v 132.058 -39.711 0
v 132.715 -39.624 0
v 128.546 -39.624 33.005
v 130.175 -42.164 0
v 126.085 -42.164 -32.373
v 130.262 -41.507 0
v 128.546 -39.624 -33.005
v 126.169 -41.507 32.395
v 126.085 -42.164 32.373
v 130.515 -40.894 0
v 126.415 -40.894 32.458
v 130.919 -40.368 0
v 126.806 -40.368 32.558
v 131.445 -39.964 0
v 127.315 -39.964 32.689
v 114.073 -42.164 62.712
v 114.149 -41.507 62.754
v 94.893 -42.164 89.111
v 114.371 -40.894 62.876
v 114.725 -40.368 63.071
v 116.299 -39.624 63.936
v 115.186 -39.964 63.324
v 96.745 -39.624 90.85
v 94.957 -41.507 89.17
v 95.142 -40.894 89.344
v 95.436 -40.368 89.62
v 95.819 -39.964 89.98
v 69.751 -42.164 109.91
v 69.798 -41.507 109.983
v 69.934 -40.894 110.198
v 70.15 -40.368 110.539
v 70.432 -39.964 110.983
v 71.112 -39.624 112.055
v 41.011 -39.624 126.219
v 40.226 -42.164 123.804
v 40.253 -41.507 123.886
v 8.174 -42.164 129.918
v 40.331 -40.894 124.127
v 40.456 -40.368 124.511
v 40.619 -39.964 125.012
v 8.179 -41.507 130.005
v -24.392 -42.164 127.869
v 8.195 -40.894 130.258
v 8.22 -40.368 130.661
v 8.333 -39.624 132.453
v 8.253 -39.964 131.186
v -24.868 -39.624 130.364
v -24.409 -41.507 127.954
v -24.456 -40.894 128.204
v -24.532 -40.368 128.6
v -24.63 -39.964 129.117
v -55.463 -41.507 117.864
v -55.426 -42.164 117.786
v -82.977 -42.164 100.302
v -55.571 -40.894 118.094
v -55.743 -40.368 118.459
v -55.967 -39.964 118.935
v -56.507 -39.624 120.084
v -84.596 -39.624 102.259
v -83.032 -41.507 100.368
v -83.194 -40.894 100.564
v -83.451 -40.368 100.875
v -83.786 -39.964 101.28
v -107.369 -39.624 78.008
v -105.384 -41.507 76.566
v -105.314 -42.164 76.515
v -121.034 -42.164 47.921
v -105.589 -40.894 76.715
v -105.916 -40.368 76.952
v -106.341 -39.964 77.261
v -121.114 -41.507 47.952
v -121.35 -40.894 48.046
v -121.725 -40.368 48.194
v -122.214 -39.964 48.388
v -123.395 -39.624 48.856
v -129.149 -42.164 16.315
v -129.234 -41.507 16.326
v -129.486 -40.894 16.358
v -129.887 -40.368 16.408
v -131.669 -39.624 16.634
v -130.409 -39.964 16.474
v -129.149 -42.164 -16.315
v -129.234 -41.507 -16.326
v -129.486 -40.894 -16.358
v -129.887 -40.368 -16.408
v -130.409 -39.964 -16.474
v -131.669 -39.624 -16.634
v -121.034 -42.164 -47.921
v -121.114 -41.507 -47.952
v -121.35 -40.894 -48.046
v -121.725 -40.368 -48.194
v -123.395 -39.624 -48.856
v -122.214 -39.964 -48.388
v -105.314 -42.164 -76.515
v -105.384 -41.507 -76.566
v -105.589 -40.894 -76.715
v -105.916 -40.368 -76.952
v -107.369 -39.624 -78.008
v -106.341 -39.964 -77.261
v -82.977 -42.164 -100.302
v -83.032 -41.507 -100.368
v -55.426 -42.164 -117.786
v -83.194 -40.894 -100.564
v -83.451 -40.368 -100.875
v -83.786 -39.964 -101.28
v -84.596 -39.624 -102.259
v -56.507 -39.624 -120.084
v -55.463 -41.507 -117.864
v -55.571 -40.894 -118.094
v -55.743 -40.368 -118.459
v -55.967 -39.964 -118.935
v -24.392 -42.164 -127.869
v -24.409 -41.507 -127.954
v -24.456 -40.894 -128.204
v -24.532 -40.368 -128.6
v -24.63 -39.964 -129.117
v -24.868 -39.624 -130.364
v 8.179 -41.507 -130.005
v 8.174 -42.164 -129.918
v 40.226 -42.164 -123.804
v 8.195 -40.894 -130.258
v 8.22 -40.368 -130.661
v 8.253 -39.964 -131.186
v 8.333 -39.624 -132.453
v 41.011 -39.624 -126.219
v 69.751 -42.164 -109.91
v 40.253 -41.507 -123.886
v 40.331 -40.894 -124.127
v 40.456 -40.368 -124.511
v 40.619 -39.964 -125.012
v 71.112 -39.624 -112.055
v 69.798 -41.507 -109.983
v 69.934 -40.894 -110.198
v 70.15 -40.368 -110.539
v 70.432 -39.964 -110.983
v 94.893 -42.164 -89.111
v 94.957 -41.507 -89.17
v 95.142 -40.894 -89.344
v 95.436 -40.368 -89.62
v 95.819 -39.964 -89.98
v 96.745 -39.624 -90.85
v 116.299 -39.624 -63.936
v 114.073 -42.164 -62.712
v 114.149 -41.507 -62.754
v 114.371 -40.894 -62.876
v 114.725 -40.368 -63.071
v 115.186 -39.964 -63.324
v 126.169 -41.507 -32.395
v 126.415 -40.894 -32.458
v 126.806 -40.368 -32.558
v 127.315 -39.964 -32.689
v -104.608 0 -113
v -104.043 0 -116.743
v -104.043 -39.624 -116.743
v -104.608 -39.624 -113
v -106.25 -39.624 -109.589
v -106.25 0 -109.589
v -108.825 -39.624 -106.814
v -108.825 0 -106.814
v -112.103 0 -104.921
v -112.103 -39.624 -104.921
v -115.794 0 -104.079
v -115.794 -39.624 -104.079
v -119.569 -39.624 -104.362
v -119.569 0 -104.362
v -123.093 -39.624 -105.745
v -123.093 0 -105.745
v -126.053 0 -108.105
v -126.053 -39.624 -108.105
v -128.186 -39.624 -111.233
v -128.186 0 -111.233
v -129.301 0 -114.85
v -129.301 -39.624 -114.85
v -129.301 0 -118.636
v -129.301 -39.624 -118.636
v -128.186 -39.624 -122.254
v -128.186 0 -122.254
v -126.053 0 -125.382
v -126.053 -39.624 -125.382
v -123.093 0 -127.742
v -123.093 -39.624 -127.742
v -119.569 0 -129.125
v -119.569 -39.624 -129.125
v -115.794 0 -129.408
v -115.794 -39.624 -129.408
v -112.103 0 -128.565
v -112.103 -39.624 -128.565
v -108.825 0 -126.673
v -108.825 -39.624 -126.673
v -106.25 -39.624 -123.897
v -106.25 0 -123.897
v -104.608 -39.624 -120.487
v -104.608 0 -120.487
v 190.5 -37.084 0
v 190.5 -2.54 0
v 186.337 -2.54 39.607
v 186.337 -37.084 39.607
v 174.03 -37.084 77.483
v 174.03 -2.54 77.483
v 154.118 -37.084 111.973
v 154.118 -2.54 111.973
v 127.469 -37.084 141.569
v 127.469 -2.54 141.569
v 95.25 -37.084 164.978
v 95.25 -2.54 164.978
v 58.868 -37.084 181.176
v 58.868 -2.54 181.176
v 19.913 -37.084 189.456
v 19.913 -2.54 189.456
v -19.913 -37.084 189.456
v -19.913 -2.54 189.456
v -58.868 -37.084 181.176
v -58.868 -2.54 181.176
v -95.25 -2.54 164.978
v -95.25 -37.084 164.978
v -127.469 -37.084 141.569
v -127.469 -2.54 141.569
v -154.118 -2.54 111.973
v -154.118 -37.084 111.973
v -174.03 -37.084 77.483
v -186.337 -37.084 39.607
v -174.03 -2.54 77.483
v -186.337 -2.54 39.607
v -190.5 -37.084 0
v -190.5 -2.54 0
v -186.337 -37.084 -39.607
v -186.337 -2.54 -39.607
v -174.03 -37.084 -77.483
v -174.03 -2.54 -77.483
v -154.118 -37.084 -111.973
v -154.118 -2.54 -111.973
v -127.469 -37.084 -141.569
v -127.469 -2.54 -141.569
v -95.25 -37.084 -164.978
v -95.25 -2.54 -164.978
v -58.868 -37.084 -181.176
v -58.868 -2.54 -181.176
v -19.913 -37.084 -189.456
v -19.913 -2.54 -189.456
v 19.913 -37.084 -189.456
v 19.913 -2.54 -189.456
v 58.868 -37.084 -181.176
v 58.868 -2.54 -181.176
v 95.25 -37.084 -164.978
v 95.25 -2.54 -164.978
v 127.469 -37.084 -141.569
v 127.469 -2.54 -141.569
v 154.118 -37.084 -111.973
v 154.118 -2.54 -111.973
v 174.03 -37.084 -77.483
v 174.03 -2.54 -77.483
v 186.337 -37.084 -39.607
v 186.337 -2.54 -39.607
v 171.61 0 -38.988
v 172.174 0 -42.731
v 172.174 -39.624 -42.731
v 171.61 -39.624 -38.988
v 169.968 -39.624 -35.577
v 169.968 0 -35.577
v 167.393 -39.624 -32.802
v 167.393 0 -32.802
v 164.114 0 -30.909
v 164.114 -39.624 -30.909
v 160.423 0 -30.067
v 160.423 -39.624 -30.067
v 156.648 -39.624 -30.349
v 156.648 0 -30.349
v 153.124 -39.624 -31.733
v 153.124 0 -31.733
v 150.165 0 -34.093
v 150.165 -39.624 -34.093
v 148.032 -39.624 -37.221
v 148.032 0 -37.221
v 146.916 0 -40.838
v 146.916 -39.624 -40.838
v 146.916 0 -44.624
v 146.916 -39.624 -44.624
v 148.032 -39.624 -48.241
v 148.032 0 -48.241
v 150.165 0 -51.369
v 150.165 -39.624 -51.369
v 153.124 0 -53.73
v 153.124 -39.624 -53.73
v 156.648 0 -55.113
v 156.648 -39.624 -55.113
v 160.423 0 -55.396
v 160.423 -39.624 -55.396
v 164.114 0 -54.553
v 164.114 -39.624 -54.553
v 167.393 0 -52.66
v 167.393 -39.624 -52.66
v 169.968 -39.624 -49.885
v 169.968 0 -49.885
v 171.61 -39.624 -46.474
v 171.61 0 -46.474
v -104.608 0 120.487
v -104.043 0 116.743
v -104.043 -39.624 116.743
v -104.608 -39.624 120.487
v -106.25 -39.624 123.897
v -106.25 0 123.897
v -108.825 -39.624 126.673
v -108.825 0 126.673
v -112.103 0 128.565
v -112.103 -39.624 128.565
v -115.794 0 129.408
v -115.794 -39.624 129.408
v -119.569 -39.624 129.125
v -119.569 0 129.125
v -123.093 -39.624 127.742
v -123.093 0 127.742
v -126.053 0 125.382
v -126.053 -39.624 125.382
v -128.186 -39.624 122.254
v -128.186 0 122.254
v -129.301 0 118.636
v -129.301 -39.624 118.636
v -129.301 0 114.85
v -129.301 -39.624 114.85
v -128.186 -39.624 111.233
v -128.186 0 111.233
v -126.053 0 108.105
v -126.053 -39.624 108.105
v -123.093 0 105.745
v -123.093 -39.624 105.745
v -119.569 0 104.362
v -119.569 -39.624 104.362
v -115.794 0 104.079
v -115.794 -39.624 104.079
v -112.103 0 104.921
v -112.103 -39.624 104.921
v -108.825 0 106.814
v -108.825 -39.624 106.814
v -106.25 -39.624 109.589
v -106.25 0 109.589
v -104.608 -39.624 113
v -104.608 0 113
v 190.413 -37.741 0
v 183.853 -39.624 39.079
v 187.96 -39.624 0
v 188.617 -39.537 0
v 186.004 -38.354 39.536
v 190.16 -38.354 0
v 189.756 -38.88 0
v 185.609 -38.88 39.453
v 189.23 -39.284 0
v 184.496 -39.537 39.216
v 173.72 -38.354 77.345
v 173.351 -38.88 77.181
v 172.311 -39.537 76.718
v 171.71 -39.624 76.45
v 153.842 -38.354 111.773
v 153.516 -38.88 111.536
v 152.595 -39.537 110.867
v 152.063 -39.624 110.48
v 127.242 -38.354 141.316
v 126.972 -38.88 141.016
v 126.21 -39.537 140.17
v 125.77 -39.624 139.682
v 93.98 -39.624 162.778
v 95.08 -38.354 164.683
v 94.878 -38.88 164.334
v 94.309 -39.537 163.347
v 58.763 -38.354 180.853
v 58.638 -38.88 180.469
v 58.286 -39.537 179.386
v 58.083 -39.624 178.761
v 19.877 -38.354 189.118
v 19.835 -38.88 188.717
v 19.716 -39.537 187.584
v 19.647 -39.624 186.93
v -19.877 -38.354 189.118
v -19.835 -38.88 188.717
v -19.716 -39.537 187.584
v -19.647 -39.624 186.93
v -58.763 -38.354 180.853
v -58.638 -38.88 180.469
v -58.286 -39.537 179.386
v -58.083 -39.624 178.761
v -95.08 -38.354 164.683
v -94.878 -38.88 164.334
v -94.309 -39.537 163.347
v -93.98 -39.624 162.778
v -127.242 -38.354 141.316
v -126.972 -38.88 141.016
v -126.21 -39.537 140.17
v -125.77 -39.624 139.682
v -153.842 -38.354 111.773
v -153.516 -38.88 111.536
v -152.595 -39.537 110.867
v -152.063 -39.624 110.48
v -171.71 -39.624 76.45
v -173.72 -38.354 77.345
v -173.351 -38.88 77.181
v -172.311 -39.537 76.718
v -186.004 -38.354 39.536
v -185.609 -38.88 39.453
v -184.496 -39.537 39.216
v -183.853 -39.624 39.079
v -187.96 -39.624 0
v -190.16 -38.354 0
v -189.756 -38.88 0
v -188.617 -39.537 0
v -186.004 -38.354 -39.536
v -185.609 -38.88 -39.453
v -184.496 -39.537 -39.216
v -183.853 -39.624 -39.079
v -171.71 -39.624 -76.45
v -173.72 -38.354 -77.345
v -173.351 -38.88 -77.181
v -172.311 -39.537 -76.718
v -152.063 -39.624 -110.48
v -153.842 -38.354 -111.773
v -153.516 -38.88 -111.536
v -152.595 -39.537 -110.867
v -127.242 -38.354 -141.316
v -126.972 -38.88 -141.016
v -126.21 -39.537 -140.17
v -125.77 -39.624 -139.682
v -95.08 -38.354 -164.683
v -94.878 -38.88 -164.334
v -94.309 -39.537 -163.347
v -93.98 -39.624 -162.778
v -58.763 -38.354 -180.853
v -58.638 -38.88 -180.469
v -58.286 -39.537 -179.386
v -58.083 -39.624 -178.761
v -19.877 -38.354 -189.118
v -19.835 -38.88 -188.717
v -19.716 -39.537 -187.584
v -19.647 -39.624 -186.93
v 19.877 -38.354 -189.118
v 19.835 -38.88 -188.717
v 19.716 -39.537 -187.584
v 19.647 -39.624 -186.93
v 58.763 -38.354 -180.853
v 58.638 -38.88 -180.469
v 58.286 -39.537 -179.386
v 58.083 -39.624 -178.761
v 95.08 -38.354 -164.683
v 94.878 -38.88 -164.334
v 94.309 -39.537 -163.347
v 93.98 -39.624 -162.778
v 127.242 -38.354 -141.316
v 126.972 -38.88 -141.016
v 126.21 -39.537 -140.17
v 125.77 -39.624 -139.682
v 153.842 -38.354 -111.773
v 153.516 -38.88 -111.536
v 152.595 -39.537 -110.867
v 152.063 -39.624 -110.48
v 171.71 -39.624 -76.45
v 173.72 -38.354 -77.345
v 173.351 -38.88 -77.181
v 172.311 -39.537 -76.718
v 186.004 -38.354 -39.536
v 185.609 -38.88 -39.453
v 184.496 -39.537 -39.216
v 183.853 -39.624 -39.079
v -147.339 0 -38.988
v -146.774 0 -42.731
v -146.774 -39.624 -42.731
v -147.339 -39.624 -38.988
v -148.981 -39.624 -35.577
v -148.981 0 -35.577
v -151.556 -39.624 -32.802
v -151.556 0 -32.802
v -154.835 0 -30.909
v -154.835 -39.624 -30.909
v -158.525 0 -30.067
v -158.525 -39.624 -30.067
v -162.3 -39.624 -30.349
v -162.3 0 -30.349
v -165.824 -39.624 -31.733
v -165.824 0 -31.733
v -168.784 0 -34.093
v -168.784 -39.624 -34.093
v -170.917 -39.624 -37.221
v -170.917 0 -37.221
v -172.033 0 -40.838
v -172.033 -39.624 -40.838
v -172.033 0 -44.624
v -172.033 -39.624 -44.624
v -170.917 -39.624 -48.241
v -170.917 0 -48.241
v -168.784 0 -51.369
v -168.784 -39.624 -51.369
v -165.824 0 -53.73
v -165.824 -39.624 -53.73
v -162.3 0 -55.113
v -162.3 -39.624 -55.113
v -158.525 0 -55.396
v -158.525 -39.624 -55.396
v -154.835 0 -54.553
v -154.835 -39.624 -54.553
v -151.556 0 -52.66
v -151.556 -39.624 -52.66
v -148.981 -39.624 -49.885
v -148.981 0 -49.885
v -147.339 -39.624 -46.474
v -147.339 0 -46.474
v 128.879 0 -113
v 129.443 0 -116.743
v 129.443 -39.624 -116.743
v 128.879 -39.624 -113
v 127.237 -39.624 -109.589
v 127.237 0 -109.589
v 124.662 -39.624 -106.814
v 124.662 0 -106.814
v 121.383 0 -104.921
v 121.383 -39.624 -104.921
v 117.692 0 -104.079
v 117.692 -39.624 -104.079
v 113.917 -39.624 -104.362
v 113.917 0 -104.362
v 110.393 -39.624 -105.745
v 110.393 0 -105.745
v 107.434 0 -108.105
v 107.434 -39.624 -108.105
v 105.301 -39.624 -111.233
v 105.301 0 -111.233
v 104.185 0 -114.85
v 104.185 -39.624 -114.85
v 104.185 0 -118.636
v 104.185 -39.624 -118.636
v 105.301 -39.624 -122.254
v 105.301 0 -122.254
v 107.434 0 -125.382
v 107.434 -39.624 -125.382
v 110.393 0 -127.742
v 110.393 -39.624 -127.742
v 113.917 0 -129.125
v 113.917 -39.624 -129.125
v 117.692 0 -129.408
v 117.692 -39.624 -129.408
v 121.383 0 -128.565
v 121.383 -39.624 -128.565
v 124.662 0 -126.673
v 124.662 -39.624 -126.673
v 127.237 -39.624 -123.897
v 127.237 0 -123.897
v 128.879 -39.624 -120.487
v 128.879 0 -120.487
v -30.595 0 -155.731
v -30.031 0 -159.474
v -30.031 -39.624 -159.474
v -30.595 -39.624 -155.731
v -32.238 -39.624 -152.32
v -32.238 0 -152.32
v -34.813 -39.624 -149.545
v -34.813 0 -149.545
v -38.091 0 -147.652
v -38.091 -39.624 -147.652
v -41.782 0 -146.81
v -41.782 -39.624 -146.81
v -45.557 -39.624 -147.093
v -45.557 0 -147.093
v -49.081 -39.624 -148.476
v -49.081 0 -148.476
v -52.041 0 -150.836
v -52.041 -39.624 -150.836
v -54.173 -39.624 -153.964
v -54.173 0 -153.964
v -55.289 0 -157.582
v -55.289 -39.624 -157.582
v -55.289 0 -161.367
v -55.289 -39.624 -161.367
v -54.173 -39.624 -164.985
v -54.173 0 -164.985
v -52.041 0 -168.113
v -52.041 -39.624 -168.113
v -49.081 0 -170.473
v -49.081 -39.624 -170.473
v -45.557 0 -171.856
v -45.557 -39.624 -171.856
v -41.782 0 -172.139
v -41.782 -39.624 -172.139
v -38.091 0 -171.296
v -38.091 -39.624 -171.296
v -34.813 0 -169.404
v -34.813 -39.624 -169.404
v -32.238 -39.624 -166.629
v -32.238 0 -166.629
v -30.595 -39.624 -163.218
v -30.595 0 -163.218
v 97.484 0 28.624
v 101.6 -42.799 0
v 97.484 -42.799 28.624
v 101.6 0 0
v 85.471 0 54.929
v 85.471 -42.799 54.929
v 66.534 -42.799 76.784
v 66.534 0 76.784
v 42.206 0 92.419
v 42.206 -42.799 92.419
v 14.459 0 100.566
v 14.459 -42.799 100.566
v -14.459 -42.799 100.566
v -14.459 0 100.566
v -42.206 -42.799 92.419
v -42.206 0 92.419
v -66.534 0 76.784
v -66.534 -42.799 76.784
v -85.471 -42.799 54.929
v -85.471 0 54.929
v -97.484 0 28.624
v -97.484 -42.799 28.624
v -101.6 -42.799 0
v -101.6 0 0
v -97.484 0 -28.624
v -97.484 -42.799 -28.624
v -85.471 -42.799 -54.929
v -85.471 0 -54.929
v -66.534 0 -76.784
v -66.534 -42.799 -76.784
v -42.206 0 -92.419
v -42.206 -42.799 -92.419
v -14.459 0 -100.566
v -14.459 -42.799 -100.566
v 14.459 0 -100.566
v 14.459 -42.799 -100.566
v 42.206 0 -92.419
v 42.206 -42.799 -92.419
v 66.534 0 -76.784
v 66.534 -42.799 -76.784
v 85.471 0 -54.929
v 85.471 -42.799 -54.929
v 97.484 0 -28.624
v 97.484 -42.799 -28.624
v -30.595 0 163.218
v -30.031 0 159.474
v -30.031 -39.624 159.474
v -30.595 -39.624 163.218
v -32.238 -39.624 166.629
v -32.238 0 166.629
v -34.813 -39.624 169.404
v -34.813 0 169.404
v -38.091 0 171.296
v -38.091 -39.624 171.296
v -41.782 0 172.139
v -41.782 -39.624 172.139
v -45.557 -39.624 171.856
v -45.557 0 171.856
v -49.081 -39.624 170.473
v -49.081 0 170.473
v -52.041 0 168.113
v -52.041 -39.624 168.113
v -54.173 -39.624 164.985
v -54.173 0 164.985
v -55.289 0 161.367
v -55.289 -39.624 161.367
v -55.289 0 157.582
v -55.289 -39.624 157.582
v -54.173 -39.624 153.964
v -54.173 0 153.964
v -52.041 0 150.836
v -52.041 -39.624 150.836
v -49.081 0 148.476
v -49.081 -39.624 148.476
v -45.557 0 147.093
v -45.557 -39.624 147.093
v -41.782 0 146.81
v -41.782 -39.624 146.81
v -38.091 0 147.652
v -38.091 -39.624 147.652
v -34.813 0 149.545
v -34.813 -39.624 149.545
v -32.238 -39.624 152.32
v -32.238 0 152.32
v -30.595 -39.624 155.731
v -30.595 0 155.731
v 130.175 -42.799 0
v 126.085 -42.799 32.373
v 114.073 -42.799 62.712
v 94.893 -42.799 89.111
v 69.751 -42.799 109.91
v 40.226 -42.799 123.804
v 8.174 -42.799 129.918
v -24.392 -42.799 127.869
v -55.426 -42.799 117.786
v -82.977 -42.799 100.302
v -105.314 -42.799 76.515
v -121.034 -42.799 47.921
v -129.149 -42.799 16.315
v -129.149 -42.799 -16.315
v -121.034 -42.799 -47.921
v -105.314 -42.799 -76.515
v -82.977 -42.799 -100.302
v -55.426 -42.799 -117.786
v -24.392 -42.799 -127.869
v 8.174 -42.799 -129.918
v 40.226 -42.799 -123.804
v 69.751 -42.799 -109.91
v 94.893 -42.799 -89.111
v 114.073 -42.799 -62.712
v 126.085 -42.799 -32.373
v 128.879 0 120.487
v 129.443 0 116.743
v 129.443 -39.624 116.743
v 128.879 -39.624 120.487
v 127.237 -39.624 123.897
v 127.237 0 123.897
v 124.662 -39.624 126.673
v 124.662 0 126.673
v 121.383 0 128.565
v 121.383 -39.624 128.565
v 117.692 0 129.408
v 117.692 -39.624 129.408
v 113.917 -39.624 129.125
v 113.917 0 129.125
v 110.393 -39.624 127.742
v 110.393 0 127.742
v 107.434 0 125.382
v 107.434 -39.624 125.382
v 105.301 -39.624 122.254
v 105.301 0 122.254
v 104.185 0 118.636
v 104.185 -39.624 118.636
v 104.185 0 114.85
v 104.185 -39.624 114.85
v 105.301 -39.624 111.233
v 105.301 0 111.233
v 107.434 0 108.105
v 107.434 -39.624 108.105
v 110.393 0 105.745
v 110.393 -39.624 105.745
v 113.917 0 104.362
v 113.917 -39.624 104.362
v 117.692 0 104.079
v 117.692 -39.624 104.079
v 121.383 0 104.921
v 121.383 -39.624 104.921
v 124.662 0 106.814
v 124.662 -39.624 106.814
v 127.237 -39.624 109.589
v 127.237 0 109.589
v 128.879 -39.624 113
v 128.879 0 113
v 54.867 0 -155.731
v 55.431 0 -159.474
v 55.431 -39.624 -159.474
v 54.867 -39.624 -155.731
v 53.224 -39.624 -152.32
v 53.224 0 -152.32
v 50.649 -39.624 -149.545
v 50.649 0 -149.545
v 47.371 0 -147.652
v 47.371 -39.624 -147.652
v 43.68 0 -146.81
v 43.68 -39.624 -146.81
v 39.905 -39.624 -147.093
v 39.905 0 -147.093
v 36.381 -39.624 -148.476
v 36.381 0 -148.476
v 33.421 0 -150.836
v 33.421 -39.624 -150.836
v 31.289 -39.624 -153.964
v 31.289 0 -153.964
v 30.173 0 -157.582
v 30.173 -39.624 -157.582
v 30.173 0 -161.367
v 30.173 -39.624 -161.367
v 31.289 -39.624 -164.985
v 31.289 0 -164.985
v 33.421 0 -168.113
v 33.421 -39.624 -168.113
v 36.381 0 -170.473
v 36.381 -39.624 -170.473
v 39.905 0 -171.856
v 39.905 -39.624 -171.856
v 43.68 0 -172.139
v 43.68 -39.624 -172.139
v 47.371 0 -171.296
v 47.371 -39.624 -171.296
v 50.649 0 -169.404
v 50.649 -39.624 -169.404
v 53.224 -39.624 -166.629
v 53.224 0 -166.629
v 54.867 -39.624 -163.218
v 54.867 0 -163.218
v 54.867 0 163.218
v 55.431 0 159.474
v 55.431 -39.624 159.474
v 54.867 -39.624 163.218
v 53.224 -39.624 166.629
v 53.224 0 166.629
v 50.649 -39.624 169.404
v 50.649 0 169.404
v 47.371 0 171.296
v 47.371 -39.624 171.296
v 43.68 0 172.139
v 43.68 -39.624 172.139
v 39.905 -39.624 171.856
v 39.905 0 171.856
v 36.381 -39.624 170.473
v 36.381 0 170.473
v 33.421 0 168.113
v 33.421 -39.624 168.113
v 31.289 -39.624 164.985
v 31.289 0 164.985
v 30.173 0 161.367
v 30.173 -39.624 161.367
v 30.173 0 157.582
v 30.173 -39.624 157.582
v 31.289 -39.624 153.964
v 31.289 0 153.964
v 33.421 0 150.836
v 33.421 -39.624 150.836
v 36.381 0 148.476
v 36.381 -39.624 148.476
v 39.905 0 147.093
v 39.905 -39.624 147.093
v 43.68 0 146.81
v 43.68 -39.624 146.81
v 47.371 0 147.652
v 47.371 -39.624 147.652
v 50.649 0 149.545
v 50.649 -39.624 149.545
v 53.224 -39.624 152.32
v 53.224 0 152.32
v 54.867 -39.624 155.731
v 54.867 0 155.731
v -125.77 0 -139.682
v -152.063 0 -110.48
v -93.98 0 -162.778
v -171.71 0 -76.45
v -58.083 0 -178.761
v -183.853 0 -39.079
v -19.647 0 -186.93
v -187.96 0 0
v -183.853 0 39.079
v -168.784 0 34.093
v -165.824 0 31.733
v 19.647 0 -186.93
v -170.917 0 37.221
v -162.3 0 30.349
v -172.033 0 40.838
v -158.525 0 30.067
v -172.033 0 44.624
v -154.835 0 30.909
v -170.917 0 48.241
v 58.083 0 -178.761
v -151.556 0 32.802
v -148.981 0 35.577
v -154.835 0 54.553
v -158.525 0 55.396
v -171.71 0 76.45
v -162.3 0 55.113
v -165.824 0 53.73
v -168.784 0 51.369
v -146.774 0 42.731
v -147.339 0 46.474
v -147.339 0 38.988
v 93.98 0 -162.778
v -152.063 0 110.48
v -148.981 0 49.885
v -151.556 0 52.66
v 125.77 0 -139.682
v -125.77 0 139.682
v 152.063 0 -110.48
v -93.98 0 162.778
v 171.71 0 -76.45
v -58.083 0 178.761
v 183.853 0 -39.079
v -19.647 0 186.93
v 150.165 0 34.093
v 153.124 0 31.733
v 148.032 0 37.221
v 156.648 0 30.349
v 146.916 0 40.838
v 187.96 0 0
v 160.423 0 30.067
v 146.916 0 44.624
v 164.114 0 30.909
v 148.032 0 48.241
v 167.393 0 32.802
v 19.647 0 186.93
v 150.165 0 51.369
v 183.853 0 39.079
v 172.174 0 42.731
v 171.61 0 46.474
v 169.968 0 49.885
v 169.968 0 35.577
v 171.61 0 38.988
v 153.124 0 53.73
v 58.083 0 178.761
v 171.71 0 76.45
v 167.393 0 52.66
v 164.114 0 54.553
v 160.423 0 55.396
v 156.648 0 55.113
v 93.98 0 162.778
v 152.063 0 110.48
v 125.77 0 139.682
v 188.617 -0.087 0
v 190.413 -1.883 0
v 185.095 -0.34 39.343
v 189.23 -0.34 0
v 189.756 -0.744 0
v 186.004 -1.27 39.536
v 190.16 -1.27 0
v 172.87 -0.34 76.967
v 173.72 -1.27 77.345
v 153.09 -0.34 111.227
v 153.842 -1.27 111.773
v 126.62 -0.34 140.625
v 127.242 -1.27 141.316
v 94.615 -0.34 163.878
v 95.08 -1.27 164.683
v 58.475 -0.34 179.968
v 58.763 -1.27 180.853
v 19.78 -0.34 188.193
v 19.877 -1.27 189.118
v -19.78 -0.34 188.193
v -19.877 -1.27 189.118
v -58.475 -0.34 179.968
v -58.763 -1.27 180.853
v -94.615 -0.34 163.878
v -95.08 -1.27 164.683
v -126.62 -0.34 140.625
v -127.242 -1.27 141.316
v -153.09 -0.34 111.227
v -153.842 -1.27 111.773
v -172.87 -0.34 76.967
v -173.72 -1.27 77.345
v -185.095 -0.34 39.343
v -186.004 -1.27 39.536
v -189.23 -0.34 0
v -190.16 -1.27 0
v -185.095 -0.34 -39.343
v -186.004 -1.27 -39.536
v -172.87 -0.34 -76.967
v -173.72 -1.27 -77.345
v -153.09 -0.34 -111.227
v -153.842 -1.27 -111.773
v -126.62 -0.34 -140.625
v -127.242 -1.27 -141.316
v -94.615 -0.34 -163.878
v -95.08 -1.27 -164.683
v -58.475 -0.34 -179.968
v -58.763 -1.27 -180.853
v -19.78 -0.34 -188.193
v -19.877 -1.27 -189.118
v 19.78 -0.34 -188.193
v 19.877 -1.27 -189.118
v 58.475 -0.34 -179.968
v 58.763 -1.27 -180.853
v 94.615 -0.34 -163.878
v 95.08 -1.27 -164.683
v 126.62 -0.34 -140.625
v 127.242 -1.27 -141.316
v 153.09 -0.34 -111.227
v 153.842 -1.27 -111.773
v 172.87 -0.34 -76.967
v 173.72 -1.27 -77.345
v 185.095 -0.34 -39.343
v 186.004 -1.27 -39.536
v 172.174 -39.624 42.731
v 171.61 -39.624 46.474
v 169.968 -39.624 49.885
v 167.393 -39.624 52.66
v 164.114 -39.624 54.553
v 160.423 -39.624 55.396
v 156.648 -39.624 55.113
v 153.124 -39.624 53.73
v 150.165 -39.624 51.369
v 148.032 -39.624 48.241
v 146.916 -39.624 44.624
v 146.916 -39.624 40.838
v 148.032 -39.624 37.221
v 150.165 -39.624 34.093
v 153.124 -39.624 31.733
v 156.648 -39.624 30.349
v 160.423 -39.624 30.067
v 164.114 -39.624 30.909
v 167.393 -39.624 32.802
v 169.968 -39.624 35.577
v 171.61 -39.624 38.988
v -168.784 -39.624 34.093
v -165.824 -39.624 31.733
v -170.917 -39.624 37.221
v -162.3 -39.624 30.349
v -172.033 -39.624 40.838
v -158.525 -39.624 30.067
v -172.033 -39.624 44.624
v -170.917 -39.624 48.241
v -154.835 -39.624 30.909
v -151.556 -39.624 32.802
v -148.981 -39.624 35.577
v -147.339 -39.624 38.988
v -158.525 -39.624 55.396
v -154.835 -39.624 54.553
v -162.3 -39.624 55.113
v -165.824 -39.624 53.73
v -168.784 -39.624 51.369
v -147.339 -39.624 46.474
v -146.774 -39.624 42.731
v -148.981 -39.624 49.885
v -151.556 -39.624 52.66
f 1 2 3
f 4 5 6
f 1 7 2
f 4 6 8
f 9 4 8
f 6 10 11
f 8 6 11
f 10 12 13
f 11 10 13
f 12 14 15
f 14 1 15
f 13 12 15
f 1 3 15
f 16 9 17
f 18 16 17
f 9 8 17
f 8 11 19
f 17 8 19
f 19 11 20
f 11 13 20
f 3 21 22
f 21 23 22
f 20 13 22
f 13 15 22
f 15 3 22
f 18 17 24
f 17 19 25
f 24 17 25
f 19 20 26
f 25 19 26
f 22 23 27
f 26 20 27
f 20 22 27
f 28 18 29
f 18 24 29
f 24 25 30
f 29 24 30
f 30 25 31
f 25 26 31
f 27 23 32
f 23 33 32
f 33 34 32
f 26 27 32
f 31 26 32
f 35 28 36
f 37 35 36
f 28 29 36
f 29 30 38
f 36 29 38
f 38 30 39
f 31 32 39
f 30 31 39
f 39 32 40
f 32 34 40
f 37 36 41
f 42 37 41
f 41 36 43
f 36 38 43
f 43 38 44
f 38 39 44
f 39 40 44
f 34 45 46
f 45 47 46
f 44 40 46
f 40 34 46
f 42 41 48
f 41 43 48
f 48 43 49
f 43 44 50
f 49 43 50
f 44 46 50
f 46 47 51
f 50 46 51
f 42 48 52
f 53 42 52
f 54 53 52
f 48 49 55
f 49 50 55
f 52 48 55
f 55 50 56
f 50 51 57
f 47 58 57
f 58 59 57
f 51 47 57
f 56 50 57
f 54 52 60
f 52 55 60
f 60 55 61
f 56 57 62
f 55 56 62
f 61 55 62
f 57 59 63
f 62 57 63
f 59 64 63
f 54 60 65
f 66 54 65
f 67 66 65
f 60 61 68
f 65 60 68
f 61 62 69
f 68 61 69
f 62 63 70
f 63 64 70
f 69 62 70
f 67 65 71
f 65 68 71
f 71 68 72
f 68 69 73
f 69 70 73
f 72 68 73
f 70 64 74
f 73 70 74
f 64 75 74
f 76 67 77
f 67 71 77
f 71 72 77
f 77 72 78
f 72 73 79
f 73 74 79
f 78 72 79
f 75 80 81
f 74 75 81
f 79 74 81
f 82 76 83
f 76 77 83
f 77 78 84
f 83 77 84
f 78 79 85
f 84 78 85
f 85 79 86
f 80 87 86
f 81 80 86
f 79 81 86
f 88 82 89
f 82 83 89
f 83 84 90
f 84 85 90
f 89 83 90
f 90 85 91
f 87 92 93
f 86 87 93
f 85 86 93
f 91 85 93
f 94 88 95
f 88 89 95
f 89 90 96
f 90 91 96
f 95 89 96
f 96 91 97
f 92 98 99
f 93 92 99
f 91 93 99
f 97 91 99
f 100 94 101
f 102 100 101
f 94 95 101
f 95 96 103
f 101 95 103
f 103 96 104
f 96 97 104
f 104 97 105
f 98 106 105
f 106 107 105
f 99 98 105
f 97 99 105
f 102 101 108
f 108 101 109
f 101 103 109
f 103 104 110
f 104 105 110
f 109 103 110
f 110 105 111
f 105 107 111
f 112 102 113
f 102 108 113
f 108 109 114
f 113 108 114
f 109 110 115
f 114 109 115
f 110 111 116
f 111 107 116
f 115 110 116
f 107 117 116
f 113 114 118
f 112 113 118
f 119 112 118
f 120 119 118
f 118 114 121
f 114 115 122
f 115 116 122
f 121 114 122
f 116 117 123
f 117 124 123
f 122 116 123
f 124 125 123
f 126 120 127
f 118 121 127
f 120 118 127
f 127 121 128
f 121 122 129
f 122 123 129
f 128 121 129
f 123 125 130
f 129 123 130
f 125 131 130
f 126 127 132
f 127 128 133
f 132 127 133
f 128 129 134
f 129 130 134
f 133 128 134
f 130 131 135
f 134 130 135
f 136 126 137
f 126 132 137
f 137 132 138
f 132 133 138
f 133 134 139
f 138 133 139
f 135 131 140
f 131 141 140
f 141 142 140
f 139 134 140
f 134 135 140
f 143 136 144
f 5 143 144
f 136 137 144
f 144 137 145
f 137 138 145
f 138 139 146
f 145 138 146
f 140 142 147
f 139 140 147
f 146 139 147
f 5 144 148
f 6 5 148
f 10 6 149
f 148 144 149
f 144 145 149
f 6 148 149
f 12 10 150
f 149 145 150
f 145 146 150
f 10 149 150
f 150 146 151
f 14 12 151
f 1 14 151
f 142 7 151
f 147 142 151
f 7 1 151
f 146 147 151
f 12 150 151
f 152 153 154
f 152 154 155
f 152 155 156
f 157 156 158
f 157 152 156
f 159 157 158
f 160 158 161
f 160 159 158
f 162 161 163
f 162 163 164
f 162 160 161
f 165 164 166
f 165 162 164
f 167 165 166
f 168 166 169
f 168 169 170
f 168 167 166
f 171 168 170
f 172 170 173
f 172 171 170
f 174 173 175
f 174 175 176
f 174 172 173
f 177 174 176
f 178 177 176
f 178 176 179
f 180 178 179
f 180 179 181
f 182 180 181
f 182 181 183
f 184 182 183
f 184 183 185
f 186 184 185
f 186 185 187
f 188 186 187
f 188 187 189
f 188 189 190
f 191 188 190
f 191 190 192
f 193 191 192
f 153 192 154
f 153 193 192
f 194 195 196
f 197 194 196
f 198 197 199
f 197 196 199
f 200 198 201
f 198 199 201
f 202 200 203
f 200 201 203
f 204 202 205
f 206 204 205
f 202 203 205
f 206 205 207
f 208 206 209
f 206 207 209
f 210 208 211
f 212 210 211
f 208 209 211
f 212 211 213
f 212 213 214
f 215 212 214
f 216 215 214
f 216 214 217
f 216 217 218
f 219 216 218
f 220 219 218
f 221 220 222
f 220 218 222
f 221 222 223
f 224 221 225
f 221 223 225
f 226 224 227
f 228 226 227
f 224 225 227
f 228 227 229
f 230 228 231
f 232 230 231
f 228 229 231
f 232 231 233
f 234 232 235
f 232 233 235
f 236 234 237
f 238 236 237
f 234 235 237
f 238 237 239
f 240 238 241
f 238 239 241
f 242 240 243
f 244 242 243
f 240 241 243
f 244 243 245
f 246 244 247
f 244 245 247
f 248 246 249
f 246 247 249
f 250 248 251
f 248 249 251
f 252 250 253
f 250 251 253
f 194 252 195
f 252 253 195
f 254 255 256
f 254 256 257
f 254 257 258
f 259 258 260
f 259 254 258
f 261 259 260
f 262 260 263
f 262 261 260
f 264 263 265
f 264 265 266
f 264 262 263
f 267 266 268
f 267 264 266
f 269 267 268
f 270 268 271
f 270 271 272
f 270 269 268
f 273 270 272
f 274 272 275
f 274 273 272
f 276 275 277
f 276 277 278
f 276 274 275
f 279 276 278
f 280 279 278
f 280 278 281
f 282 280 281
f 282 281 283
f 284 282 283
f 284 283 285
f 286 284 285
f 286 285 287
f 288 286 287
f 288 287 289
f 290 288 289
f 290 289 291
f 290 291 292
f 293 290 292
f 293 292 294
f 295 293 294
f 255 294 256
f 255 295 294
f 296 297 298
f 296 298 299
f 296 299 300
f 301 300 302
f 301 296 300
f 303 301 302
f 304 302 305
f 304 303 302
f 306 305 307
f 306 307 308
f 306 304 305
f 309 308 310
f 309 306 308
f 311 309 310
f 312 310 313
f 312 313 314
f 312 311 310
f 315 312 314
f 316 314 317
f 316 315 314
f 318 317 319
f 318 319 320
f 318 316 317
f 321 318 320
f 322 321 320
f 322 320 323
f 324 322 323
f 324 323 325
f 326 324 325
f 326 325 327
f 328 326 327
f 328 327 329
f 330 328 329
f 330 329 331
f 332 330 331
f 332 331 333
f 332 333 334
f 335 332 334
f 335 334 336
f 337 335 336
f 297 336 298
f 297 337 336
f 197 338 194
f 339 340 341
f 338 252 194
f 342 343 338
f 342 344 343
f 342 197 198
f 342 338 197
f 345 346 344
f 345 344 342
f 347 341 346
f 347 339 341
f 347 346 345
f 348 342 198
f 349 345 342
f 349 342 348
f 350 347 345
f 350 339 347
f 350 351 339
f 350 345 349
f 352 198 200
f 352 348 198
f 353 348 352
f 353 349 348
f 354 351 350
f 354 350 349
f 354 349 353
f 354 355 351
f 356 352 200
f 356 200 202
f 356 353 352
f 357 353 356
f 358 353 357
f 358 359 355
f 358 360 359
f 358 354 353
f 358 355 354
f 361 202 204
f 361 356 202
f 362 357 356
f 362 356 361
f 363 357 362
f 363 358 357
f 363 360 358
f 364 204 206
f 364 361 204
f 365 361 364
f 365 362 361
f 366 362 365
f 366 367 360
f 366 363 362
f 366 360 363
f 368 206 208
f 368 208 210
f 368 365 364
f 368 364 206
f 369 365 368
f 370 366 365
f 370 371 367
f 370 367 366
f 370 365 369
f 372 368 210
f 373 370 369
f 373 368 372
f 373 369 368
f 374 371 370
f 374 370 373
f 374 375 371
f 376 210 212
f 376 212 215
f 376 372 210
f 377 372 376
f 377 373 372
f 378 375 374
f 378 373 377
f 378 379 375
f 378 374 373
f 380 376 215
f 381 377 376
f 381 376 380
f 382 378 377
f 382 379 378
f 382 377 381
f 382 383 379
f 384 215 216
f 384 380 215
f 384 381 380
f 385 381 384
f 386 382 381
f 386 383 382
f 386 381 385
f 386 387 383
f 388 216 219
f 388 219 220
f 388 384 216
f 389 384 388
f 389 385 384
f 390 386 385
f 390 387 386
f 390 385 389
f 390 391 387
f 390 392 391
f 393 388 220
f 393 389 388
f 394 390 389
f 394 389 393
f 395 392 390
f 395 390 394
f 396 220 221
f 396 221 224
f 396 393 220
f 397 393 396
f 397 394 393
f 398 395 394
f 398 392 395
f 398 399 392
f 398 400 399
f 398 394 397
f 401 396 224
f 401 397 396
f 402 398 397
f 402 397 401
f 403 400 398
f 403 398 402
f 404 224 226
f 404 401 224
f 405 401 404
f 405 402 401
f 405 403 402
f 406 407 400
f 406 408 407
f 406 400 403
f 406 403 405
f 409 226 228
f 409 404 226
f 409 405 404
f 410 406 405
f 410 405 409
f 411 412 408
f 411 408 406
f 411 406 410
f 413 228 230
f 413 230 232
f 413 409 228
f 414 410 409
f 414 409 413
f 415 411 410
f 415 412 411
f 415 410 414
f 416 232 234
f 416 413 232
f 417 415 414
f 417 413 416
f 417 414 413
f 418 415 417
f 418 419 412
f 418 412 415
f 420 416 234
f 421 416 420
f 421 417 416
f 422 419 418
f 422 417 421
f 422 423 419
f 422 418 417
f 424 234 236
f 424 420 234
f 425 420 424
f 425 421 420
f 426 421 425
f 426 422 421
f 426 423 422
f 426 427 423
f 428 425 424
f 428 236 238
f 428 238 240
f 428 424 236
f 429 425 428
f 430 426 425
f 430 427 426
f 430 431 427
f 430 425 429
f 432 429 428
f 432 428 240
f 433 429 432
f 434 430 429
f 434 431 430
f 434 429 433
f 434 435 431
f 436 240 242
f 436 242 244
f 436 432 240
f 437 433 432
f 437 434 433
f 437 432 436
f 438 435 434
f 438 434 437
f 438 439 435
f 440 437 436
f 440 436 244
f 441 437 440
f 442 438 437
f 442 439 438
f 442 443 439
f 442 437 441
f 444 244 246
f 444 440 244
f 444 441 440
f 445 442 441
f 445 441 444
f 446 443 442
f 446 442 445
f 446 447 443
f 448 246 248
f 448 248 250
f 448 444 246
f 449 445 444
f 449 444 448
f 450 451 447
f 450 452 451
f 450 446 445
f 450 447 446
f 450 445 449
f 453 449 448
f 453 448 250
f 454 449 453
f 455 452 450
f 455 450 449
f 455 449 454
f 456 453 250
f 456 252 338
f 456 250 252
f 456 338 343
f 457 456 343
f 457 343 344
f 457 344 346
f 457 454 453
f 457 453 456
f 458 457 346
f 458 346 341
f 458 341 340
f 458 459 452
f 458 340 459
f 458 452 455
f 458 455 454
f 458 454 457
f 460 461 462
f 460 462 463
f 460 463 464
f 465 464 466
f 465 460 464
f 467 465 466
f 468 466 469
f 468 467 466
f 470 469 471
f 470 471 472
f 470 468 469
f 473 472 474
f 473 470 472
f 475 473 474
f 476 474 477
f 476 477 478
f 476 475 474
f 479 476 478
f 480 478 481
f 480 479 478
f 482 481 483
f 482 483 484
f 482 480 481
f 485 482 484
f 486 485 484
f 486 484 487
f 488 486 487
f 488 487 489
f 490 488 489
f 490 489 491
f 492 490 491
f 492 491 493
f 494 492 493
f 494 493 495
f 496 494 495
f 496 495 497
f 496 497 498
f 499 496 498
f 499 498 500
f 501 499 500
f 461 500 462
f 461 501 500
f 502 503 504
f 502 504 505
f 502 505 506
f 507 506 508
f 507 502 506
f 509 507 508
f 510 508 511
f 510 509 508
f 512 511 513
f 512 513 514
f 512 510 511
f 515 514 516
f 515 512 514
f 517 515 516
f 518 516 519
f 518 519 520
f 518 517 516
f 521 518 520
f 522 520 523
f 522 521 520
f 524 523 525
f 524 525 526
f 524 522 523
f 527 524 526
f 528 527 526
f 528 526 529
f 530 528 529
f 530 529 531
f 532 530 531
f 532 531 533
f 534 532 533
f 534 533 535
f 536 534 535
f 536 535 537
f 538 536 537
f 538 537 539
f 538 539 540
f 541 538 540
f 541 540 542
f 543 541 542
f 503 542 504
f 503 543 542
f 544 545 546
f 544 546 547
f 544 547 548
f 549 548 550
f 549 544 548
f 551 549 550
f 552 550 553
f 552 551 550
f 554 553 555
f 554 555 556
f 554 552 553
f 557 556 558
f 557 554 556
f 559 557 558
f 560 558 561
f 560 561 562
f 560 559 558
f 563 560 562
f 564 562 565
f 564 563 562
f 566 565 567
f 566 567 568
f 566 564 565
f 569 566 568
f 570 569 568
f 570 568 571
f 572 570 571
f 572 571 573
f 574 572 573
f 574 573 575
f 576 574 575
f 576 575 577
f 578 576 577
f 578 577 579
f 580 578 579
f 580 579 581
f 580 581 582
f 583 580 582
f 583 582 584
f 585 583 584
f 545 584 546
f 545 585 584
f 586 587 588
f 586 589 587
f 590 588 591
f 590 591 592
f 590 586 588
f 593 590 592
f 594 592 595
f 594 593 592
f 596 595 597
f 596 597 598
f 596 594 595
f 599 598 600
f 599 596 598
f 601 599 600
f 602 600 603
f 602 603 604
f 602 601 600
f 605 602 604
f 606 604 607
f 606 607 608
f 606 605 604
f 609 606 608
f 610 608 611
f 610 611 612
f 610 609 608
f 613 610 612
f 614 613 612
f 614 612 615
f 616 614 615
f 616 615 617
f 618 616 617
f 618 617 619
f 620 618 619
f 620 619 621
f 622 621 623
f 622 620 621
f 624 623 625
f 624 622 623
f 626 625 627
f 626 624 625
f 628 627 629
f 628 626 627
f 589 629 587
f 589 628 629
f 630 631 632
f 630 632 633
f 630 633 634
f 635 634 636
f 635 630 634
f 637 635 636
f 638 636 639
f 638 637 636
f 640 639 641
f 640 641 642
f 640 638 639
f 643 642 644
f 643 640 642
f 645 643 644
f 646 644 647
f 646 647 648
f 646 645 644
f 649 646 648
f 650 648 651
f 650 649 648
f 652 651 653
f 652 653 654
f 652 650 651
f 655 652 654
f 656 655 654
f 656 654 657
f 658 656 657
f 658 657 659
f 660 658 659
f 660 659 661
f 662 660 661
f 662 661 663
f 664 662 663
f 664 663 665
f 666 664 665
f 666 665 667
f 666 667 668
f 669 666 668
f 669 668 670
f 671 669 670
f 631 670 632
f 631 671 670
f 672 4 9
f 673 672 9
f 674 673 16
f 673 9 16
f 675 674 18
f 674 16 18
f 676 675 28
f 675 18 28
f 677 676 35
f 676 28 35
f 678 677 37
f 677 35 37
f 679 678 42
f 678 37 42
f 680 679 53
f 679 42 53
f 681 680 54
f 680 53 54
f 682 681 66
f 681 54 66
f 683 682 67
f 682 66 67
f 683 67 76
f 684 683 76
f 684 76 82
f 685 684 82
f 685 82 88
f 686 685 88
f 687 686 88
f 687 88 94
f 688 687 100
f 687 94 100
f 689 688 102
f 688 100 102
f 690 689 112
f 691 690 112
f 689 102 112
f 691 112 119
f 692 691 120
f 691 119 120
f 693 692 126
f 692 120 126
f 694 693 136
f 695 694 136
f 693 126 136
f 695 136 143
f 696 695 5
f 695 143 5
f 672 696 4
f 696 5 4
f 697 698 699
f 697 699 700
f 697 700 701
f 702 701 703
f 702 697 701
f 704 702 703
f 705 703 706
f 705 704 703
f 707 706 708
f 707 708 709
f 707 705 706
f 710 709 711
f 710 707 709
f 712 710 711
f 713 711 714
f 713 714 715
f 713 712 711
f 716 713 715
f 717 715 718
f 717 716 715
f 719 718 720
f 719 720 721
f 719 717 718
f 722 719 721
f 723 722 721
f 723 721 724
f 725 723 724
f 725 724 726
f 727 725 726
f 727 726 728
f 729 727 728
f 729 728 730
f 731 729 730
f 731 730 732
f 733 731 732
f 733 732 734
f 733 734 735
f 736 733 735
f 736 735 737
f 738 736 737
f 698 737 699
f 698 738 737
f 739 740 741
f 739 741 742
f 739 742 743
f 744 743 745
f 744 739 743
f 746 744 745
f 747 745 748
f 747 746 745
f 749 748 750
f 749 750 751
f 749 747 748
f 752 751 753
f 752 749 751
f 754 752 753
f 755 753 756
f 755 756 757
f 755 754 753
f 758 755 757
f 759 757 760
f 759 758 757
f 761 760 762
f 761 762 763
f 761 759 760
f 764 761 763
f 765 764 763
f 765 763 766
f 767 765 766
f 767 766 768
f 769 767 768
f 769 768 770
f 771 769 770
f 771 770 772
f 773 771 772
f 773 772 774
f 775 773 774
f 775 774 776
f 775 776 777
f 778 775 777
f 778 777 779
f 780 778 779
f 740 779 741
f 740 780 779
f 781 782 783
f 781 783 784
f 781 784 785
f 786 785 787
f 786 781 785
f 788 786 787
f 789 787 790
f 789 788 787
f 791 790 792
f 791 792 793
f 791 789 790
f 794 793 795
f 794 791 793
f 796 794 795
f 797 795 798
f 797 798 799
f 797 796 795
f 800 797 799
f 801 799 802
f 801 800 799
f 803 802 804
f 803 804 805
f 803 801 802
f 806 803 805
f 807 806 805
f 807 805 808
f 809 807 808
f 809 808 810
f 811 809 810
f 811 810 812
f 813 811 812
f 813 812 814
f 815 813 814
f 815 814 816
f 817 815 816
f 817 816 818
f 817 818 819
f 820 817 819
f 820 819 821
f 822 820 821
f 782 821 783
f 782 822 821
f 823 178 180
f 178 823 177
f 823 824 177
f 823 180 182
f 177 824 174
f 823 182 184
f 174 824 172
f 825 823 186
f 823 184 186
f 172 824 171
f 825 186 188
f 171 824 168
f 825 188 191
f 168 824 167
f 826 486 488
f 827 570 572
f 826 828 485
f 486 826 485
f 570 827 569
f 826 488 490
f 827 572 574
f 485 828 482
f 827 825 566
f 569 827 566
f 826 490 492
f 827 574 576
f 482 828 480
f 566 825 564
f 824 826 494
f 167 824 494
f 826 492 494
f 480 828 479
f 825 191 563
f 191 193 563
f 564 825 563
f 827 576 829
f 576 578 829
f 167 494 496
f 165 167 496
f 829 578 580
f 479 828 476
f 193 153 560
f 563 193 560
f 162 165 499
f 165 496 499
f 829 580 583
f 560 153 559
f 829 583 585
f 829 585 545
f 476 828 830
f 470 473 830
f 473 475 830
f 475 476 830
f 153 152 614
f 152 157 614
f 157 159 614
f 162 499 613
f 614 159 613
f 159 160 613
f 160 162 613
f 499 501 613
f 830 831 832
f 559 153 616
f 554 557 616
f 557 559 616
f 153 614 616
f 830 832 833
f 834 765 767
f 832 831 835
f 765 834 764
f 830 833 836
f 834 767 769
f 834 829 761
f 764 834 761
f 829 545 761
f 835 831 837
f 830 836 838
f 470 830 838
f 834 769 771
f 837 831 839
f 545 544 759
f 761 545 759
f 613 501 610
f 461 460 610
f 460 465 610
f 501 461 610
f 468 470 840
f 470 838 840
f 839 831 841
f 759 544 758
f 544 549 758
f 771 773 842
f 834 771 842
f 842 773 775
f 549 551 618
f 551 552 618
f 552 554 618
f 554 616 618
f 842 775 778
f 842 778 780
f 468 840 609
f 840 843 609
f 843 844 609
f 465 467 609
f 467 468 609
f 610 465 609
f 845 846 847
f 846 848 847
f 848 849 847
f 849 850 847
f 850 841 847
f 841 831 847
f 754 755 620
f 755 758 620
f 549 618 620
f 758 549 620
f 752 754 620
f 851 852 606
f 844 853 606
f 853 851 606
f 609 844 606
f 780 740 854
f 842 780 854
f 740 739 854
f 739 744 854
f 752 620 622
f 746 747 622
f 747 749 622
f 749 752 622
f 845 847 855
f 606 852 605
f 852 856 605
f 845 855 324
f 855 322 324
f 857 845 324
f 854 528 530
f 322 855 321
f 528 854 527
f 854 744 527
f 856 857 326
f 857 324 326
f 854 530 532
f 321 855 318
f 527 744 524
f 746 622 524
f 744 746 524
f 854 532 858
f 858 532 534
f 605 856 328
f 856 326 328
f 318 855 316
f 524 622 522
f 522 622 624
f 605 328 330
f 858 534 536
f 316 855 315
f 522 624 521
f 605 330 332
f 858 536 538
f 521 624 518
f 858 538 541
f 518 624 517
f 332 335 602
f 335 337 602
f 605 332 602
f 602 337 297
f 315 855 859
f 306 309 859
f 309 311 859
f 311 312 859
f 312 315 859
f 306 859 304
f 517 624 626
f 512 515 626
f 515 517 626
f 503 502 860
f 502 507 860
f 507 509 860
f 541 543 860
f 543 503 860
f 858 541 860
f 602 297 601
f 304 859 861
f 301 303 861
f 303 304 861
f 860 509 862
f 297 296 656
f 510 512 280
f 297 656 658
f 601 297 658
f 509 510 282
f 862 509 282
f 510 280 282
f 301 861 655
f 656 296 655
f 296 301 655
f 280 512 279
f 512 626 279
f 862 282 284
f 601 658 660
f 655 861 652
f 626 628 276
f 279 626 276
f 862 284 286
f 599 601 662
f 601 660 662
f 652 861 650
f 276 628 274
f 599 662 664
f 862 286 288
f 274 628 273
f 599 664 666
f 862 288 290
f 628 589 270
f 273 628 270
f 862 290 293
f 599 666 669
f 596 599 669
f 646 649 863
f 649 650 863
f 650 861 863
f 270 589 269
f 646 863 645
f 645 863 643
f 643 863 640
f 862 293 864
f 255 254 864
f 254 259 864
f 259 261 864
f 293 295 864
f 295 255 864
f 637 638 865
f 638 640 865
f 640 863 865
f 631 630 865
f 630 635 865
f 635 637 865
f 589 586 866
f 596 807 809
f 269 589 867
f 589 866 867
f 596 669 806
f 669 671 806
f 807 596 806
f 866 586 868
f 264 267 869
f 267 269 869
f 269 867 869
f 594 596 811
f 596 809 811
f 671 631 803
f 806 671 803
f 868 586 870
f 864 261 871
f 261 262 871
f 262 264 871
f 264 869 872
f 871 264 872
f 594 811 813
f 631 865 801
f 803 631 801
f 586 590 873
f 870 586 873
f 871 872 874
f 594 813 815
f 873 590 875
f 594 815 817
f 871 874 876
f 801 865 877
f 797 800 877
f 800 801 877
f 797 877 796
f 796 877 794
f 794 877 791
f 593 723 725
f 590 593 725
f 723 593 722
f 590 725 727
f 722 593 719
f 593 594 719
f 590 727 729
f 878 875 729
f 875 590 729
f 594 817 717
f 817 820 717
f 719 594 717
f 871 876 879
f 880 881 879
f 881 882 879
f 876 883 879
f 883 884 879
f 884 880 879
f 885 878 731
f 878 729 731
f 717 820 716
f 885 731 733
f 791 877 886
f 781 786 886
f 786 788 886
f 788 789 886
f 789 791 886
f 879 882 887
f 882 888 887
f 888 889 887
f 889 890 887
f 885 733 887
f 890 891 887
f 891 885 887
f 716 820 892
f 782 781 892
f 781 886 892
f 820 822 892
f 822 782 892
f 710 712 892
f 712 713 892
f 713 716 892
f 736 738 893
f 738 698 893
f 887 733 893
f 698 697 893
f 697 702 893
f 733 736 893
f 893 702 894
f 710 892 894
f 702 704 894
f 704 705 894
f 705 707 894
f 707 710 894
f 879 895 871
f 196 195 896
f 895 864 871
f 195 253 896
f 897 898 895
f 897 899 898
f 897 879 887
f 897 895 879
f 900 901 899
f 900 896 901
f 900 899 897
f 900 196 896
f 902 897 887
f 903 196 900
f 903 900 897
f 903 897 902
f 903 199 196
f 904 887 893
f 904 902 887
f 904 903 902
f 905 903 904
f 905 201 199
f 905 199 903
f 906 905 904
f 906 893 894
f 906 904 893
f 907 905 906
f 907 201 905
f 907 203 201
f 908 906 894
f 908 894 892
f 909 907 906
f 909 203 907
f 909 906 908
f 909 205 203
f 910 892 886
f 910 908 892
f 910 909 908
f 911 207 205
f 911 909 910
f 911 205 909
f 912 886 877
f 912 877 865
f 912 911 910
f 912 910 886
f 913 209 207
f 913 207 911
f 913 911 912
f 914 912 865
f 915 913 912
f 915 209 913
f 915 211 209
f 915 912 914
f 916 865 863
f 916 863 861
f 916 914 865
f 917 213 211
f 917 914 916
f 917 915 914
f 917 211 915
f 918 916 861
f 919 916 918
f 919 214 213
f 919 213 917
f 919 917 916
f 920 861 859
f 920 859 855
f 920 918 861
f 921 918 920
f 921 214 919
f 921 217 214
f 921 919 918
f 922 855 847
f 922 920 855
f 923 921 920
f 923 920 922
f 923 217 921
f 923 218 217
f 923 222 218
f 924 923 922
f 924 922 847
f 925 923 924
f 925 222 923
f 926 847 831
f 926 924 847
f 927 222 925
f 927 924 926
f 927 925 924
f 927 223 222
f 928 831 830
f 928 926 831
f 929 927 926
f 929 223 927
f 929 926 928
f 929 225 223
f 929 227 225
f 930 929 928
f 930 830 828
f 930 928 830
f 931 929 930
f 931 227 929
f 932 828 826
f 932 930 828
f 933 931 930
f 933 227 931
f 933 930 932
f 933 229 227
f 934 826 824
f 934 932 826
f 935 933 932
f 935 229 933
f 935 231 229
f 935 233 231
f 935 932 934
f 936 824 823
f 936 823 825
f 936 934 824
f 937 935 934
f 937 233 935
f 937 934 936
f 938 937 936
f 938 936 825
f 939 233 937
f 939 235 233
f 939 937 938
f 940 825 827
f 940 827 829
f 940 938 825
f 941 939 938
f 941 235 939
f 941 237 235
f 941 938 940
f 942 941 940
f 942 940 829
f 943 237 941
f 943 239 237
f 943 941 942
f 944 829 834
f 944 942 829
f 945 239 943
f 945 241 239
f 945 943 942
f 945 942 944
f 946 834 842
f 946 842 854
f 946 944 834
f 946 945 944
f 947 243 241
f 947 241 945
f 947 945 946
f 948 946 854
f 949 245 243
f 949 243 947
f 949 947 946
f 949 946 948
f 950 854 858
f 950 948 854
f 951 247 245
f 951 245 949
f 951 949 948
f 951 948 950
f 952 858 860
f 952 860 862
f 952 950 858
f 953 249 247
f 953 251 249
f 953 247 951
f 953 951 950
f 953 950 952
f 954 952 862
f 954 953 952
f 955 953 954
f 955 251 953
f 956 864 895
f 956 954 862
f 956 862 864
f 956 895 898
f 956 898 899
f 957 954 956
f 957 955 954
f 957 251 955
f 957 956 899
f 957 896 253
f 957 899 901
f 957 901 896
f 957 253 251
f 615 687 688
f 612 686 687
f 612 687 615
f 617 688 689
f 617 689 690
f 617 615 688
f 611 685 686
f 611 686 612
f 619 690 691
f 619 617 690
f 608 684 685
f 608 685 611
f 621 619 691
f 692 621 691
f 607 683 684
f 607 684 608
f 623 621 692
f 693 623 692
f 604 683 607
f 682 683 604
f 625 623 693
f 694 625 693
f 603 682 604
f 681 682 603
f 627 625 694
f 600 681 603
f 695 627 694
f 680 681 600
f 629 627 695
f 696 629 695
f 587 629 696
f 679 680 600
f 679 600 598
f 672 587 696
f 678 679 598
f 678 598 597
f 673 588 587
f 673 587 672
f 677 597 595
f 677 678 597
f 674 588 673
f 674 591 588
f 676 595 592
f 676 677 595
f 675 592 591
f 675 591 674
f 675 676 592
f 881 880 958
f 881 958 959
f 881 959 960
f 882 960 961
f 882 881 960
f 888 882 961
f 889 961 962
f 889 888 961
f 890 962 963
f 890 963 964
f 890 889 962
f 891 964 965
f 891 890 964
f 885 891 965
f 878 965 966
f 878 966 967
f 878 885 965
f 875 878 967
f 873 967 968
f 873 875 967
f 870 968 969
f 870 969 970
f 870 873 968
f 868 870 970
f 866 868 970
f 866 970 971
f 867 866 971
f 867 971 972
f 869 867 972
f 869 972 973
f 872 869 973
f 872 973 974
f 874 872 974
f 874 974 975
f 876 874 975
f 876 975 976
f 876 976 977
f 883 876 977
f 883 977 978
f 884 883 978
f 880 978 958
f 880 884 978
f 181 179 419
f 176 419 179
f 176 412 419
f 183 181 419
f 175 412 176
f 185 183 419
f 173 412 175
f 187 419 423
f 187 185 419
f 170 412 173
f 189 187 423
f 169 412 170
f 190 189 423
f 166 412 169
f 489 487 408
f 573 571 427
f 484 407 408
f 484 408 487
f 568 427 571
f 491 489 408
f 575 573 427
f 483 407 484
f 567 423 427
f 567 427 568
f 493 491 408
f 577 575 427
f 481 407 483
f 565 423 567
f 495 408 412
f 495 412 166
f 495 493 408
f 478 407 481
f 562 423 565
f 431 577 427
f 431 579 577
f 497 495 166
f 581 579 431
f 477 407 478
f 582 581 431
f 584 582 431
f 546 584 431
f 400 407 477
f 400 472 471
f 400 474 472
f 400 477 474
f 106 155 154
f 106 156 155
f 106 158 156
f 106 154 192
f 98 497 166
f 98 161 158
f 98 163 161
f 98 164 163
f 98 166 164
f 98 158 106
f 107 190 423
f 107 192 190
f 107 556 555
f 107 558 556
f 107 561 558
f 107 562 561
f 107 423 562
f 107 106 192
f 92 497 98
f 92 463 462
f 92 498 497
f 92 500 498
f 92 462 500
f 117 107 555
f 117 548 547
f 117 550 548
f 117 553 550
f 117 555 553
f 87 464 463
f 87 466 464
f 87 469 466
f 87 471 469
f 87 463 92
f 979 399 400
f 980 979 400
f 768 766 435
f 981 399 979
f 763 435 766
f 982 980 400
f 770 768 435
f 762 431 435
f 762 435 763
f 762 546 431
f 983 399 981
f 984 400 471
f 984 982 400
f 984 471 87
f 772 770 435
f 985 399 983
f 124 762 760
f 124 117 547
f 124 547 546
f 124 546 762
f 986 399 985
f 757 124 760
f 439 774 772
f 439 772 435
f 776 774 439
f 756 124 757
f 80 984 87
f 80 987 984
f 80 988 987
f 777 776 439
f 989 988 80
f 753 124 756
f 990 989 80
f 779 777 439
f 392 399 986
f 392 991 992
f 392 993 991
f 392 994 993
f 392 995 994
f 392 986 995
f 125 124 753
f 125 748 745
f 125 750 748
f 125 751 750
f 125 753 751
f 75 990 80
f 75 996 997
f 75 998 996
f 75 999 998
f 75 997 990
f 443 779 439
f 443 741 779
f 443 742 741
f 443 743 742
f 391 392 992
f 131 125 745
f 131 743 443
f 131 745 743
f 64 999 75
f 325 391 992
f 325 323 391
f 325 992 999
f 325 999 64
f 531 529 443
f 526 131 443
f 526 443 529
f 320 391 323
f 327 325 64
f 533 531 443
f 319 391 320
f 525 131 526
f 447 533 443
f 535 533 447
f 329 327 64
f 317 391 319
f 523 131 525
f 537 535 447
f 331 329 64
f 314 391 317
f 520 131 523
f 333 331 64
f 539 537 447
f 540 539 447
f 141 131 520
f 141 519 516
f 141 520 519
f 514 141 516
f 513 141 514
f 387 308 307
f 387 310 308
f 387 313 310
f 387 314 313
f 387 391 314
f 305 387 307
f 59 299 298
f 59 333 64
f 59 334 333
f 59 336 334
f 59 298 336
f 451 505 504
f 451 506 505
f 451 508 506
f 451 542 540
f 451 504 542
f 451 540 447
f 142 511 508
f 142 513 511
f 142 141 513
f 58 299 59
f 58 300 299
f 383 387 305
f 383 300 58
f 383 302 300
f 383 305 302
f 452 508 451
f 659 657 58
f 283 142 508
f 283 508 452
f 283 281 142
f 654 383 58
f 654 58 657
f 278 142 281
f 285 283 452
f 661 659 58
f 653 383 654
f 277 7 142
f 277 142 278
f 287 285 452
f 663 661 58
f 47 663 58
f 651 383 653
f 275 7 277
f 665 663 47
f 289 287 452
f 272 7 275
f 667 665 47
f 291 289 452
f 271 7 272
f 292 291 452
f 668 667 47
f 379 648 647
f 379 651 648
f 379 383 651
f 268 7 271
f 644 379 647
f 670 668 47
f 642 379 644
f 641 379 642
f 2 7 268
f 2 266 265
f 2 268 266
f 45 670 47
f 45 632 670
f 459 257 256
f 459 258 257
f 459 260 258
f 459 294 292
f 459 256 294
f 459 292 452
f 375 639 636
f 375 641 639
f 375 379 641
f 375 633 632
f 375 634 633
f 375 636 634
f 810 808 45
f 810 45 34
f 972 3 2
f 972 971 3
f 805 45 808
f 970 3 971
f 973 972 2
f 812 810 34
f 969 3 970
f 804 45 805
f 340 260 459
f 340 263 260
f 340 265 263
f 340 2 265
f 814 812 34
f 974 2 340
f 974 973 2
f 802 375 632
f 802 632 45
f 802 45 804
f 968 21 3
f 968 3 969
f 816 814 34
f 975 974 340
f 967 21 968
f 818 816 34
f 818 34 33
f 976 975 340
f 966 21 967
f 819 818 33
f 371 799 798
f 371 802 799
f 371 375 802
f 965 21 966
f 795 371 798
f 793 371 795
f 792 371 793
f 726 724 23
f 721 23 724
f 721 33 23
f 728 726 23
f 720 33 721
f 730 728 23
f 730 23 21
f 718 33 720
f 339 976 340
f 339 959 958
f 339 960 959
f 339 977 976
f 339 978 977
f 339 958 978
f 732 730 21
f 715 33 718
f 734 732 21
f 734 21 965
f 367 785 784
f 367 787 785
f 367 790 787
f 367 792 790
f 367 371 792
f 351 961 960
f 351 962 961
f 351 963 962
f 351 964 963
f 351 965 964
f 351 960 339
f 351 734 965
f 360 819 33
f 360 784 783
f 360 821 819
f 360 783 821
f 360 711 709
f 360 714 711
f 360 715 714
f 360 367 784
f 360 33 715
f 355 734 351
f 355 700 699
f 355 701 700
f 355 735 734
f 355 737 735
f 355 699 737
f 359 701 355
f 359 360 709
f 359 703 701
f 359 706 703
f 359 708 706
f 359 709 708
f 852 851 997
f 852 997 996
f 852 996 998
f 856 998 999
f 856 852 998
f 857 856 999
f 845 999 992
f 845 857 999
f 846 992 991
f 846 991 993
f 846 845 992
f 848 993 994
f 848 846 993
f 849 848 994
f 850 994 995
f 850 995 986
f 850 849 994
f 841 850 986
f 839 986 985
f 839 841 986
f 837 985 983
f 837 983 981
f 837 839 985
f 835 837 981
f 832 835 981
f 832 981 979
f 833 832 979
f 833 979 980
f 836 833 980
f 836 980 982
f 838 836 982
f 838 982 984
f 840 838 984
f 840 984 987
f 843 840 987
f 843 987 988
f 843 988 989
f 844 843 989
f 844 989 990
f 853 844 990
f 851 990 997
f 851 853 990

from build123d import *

# Parameters (mm, degrees)
F0_R     = 190.5
F0_R_2   = 12.7
F0_R_3   = 101.6
F1_DEPTH = 39.624
F2_R     = 130.175
F2_R_2   = 101.6
F3_DEPTH = 3.175
F4_R     = 2.54


with BuildPart() as f1:
    # F0 (on Front) → F1 (new body)
    with BuildSketch(Plane.XZ):
        Circle(F0_R)
        with Locations((-116.74333, -116.74333)):
            Circle(F0_R_2, mode=Mode.SUBTRACT)
        with Locations((-42.731024, -159.474354)):
            Circle(F0_R_2, mode=Mode.SUBTRACT)
        with Locations((-159.474354, -42.731024)):
            Circle(F0_R_2, mode=Mode.SUBTRACT)
        with Locations((42.731024, -159.474354)):
            Circle(F0_R_2, mode=Mode.SUBTRACT)
        with Locations((116.74333, -116.74333)):
            Circle(F0_R_2, mode=Mode.SUBTRACT)
        with Locations((159.474354, -42.731024)):
            Circle(F0_R_2, mode=Mode.SUBTRACT)
        with Locations((-159.474354, 42.731024)):
            Circle(F0_R_2, mode=Mode.SUBTRACT)
        with Locations((-116.74333, 116.74333)):
            Circle(F0_R_2, mode=Mode.SUBTRACT)
        with Locations((-42.731024, 159.474354)):
            Circle(F0_R_2, mode=Mode.SUBTRACT)
        Circle(F0_R_3, mode=Mode.SUBTRACT)
        with Locations((159.474354, 42.731024)):
            Circle(F0_R_2, mode=Mode.SUBTRACT)
        with Locations((42.731024, 159.474354)):
            Circle(F0_R_2, mode=Mode.SUBTRACT)
        with Locations((116.74333, 116.74333)):
            Circle(F0_R_2, mode=Mode.SUBTRACT)
    extrude(amount=F1_DEPTH)

    # F2 (on face) → F3 (join)
    with BuildSketch(Plane.XZ.offset(39.624)):
        Circle(F2_R)
        Circle(F2_R_2, mode=Mode.SUBTRACT)
    extrude(amount=F3_DEPTH)

    # F4
    f4_edges = [f1.edges().sort_by_distance(p)[0] for p in [
        (-190.5, -39.624, 0),
        (-190.5, 0, 0),
        (-130.175, -39.624, 0),
    ]]
    fillet(f4_edges, radius=F4_R)


solid = f1.part
